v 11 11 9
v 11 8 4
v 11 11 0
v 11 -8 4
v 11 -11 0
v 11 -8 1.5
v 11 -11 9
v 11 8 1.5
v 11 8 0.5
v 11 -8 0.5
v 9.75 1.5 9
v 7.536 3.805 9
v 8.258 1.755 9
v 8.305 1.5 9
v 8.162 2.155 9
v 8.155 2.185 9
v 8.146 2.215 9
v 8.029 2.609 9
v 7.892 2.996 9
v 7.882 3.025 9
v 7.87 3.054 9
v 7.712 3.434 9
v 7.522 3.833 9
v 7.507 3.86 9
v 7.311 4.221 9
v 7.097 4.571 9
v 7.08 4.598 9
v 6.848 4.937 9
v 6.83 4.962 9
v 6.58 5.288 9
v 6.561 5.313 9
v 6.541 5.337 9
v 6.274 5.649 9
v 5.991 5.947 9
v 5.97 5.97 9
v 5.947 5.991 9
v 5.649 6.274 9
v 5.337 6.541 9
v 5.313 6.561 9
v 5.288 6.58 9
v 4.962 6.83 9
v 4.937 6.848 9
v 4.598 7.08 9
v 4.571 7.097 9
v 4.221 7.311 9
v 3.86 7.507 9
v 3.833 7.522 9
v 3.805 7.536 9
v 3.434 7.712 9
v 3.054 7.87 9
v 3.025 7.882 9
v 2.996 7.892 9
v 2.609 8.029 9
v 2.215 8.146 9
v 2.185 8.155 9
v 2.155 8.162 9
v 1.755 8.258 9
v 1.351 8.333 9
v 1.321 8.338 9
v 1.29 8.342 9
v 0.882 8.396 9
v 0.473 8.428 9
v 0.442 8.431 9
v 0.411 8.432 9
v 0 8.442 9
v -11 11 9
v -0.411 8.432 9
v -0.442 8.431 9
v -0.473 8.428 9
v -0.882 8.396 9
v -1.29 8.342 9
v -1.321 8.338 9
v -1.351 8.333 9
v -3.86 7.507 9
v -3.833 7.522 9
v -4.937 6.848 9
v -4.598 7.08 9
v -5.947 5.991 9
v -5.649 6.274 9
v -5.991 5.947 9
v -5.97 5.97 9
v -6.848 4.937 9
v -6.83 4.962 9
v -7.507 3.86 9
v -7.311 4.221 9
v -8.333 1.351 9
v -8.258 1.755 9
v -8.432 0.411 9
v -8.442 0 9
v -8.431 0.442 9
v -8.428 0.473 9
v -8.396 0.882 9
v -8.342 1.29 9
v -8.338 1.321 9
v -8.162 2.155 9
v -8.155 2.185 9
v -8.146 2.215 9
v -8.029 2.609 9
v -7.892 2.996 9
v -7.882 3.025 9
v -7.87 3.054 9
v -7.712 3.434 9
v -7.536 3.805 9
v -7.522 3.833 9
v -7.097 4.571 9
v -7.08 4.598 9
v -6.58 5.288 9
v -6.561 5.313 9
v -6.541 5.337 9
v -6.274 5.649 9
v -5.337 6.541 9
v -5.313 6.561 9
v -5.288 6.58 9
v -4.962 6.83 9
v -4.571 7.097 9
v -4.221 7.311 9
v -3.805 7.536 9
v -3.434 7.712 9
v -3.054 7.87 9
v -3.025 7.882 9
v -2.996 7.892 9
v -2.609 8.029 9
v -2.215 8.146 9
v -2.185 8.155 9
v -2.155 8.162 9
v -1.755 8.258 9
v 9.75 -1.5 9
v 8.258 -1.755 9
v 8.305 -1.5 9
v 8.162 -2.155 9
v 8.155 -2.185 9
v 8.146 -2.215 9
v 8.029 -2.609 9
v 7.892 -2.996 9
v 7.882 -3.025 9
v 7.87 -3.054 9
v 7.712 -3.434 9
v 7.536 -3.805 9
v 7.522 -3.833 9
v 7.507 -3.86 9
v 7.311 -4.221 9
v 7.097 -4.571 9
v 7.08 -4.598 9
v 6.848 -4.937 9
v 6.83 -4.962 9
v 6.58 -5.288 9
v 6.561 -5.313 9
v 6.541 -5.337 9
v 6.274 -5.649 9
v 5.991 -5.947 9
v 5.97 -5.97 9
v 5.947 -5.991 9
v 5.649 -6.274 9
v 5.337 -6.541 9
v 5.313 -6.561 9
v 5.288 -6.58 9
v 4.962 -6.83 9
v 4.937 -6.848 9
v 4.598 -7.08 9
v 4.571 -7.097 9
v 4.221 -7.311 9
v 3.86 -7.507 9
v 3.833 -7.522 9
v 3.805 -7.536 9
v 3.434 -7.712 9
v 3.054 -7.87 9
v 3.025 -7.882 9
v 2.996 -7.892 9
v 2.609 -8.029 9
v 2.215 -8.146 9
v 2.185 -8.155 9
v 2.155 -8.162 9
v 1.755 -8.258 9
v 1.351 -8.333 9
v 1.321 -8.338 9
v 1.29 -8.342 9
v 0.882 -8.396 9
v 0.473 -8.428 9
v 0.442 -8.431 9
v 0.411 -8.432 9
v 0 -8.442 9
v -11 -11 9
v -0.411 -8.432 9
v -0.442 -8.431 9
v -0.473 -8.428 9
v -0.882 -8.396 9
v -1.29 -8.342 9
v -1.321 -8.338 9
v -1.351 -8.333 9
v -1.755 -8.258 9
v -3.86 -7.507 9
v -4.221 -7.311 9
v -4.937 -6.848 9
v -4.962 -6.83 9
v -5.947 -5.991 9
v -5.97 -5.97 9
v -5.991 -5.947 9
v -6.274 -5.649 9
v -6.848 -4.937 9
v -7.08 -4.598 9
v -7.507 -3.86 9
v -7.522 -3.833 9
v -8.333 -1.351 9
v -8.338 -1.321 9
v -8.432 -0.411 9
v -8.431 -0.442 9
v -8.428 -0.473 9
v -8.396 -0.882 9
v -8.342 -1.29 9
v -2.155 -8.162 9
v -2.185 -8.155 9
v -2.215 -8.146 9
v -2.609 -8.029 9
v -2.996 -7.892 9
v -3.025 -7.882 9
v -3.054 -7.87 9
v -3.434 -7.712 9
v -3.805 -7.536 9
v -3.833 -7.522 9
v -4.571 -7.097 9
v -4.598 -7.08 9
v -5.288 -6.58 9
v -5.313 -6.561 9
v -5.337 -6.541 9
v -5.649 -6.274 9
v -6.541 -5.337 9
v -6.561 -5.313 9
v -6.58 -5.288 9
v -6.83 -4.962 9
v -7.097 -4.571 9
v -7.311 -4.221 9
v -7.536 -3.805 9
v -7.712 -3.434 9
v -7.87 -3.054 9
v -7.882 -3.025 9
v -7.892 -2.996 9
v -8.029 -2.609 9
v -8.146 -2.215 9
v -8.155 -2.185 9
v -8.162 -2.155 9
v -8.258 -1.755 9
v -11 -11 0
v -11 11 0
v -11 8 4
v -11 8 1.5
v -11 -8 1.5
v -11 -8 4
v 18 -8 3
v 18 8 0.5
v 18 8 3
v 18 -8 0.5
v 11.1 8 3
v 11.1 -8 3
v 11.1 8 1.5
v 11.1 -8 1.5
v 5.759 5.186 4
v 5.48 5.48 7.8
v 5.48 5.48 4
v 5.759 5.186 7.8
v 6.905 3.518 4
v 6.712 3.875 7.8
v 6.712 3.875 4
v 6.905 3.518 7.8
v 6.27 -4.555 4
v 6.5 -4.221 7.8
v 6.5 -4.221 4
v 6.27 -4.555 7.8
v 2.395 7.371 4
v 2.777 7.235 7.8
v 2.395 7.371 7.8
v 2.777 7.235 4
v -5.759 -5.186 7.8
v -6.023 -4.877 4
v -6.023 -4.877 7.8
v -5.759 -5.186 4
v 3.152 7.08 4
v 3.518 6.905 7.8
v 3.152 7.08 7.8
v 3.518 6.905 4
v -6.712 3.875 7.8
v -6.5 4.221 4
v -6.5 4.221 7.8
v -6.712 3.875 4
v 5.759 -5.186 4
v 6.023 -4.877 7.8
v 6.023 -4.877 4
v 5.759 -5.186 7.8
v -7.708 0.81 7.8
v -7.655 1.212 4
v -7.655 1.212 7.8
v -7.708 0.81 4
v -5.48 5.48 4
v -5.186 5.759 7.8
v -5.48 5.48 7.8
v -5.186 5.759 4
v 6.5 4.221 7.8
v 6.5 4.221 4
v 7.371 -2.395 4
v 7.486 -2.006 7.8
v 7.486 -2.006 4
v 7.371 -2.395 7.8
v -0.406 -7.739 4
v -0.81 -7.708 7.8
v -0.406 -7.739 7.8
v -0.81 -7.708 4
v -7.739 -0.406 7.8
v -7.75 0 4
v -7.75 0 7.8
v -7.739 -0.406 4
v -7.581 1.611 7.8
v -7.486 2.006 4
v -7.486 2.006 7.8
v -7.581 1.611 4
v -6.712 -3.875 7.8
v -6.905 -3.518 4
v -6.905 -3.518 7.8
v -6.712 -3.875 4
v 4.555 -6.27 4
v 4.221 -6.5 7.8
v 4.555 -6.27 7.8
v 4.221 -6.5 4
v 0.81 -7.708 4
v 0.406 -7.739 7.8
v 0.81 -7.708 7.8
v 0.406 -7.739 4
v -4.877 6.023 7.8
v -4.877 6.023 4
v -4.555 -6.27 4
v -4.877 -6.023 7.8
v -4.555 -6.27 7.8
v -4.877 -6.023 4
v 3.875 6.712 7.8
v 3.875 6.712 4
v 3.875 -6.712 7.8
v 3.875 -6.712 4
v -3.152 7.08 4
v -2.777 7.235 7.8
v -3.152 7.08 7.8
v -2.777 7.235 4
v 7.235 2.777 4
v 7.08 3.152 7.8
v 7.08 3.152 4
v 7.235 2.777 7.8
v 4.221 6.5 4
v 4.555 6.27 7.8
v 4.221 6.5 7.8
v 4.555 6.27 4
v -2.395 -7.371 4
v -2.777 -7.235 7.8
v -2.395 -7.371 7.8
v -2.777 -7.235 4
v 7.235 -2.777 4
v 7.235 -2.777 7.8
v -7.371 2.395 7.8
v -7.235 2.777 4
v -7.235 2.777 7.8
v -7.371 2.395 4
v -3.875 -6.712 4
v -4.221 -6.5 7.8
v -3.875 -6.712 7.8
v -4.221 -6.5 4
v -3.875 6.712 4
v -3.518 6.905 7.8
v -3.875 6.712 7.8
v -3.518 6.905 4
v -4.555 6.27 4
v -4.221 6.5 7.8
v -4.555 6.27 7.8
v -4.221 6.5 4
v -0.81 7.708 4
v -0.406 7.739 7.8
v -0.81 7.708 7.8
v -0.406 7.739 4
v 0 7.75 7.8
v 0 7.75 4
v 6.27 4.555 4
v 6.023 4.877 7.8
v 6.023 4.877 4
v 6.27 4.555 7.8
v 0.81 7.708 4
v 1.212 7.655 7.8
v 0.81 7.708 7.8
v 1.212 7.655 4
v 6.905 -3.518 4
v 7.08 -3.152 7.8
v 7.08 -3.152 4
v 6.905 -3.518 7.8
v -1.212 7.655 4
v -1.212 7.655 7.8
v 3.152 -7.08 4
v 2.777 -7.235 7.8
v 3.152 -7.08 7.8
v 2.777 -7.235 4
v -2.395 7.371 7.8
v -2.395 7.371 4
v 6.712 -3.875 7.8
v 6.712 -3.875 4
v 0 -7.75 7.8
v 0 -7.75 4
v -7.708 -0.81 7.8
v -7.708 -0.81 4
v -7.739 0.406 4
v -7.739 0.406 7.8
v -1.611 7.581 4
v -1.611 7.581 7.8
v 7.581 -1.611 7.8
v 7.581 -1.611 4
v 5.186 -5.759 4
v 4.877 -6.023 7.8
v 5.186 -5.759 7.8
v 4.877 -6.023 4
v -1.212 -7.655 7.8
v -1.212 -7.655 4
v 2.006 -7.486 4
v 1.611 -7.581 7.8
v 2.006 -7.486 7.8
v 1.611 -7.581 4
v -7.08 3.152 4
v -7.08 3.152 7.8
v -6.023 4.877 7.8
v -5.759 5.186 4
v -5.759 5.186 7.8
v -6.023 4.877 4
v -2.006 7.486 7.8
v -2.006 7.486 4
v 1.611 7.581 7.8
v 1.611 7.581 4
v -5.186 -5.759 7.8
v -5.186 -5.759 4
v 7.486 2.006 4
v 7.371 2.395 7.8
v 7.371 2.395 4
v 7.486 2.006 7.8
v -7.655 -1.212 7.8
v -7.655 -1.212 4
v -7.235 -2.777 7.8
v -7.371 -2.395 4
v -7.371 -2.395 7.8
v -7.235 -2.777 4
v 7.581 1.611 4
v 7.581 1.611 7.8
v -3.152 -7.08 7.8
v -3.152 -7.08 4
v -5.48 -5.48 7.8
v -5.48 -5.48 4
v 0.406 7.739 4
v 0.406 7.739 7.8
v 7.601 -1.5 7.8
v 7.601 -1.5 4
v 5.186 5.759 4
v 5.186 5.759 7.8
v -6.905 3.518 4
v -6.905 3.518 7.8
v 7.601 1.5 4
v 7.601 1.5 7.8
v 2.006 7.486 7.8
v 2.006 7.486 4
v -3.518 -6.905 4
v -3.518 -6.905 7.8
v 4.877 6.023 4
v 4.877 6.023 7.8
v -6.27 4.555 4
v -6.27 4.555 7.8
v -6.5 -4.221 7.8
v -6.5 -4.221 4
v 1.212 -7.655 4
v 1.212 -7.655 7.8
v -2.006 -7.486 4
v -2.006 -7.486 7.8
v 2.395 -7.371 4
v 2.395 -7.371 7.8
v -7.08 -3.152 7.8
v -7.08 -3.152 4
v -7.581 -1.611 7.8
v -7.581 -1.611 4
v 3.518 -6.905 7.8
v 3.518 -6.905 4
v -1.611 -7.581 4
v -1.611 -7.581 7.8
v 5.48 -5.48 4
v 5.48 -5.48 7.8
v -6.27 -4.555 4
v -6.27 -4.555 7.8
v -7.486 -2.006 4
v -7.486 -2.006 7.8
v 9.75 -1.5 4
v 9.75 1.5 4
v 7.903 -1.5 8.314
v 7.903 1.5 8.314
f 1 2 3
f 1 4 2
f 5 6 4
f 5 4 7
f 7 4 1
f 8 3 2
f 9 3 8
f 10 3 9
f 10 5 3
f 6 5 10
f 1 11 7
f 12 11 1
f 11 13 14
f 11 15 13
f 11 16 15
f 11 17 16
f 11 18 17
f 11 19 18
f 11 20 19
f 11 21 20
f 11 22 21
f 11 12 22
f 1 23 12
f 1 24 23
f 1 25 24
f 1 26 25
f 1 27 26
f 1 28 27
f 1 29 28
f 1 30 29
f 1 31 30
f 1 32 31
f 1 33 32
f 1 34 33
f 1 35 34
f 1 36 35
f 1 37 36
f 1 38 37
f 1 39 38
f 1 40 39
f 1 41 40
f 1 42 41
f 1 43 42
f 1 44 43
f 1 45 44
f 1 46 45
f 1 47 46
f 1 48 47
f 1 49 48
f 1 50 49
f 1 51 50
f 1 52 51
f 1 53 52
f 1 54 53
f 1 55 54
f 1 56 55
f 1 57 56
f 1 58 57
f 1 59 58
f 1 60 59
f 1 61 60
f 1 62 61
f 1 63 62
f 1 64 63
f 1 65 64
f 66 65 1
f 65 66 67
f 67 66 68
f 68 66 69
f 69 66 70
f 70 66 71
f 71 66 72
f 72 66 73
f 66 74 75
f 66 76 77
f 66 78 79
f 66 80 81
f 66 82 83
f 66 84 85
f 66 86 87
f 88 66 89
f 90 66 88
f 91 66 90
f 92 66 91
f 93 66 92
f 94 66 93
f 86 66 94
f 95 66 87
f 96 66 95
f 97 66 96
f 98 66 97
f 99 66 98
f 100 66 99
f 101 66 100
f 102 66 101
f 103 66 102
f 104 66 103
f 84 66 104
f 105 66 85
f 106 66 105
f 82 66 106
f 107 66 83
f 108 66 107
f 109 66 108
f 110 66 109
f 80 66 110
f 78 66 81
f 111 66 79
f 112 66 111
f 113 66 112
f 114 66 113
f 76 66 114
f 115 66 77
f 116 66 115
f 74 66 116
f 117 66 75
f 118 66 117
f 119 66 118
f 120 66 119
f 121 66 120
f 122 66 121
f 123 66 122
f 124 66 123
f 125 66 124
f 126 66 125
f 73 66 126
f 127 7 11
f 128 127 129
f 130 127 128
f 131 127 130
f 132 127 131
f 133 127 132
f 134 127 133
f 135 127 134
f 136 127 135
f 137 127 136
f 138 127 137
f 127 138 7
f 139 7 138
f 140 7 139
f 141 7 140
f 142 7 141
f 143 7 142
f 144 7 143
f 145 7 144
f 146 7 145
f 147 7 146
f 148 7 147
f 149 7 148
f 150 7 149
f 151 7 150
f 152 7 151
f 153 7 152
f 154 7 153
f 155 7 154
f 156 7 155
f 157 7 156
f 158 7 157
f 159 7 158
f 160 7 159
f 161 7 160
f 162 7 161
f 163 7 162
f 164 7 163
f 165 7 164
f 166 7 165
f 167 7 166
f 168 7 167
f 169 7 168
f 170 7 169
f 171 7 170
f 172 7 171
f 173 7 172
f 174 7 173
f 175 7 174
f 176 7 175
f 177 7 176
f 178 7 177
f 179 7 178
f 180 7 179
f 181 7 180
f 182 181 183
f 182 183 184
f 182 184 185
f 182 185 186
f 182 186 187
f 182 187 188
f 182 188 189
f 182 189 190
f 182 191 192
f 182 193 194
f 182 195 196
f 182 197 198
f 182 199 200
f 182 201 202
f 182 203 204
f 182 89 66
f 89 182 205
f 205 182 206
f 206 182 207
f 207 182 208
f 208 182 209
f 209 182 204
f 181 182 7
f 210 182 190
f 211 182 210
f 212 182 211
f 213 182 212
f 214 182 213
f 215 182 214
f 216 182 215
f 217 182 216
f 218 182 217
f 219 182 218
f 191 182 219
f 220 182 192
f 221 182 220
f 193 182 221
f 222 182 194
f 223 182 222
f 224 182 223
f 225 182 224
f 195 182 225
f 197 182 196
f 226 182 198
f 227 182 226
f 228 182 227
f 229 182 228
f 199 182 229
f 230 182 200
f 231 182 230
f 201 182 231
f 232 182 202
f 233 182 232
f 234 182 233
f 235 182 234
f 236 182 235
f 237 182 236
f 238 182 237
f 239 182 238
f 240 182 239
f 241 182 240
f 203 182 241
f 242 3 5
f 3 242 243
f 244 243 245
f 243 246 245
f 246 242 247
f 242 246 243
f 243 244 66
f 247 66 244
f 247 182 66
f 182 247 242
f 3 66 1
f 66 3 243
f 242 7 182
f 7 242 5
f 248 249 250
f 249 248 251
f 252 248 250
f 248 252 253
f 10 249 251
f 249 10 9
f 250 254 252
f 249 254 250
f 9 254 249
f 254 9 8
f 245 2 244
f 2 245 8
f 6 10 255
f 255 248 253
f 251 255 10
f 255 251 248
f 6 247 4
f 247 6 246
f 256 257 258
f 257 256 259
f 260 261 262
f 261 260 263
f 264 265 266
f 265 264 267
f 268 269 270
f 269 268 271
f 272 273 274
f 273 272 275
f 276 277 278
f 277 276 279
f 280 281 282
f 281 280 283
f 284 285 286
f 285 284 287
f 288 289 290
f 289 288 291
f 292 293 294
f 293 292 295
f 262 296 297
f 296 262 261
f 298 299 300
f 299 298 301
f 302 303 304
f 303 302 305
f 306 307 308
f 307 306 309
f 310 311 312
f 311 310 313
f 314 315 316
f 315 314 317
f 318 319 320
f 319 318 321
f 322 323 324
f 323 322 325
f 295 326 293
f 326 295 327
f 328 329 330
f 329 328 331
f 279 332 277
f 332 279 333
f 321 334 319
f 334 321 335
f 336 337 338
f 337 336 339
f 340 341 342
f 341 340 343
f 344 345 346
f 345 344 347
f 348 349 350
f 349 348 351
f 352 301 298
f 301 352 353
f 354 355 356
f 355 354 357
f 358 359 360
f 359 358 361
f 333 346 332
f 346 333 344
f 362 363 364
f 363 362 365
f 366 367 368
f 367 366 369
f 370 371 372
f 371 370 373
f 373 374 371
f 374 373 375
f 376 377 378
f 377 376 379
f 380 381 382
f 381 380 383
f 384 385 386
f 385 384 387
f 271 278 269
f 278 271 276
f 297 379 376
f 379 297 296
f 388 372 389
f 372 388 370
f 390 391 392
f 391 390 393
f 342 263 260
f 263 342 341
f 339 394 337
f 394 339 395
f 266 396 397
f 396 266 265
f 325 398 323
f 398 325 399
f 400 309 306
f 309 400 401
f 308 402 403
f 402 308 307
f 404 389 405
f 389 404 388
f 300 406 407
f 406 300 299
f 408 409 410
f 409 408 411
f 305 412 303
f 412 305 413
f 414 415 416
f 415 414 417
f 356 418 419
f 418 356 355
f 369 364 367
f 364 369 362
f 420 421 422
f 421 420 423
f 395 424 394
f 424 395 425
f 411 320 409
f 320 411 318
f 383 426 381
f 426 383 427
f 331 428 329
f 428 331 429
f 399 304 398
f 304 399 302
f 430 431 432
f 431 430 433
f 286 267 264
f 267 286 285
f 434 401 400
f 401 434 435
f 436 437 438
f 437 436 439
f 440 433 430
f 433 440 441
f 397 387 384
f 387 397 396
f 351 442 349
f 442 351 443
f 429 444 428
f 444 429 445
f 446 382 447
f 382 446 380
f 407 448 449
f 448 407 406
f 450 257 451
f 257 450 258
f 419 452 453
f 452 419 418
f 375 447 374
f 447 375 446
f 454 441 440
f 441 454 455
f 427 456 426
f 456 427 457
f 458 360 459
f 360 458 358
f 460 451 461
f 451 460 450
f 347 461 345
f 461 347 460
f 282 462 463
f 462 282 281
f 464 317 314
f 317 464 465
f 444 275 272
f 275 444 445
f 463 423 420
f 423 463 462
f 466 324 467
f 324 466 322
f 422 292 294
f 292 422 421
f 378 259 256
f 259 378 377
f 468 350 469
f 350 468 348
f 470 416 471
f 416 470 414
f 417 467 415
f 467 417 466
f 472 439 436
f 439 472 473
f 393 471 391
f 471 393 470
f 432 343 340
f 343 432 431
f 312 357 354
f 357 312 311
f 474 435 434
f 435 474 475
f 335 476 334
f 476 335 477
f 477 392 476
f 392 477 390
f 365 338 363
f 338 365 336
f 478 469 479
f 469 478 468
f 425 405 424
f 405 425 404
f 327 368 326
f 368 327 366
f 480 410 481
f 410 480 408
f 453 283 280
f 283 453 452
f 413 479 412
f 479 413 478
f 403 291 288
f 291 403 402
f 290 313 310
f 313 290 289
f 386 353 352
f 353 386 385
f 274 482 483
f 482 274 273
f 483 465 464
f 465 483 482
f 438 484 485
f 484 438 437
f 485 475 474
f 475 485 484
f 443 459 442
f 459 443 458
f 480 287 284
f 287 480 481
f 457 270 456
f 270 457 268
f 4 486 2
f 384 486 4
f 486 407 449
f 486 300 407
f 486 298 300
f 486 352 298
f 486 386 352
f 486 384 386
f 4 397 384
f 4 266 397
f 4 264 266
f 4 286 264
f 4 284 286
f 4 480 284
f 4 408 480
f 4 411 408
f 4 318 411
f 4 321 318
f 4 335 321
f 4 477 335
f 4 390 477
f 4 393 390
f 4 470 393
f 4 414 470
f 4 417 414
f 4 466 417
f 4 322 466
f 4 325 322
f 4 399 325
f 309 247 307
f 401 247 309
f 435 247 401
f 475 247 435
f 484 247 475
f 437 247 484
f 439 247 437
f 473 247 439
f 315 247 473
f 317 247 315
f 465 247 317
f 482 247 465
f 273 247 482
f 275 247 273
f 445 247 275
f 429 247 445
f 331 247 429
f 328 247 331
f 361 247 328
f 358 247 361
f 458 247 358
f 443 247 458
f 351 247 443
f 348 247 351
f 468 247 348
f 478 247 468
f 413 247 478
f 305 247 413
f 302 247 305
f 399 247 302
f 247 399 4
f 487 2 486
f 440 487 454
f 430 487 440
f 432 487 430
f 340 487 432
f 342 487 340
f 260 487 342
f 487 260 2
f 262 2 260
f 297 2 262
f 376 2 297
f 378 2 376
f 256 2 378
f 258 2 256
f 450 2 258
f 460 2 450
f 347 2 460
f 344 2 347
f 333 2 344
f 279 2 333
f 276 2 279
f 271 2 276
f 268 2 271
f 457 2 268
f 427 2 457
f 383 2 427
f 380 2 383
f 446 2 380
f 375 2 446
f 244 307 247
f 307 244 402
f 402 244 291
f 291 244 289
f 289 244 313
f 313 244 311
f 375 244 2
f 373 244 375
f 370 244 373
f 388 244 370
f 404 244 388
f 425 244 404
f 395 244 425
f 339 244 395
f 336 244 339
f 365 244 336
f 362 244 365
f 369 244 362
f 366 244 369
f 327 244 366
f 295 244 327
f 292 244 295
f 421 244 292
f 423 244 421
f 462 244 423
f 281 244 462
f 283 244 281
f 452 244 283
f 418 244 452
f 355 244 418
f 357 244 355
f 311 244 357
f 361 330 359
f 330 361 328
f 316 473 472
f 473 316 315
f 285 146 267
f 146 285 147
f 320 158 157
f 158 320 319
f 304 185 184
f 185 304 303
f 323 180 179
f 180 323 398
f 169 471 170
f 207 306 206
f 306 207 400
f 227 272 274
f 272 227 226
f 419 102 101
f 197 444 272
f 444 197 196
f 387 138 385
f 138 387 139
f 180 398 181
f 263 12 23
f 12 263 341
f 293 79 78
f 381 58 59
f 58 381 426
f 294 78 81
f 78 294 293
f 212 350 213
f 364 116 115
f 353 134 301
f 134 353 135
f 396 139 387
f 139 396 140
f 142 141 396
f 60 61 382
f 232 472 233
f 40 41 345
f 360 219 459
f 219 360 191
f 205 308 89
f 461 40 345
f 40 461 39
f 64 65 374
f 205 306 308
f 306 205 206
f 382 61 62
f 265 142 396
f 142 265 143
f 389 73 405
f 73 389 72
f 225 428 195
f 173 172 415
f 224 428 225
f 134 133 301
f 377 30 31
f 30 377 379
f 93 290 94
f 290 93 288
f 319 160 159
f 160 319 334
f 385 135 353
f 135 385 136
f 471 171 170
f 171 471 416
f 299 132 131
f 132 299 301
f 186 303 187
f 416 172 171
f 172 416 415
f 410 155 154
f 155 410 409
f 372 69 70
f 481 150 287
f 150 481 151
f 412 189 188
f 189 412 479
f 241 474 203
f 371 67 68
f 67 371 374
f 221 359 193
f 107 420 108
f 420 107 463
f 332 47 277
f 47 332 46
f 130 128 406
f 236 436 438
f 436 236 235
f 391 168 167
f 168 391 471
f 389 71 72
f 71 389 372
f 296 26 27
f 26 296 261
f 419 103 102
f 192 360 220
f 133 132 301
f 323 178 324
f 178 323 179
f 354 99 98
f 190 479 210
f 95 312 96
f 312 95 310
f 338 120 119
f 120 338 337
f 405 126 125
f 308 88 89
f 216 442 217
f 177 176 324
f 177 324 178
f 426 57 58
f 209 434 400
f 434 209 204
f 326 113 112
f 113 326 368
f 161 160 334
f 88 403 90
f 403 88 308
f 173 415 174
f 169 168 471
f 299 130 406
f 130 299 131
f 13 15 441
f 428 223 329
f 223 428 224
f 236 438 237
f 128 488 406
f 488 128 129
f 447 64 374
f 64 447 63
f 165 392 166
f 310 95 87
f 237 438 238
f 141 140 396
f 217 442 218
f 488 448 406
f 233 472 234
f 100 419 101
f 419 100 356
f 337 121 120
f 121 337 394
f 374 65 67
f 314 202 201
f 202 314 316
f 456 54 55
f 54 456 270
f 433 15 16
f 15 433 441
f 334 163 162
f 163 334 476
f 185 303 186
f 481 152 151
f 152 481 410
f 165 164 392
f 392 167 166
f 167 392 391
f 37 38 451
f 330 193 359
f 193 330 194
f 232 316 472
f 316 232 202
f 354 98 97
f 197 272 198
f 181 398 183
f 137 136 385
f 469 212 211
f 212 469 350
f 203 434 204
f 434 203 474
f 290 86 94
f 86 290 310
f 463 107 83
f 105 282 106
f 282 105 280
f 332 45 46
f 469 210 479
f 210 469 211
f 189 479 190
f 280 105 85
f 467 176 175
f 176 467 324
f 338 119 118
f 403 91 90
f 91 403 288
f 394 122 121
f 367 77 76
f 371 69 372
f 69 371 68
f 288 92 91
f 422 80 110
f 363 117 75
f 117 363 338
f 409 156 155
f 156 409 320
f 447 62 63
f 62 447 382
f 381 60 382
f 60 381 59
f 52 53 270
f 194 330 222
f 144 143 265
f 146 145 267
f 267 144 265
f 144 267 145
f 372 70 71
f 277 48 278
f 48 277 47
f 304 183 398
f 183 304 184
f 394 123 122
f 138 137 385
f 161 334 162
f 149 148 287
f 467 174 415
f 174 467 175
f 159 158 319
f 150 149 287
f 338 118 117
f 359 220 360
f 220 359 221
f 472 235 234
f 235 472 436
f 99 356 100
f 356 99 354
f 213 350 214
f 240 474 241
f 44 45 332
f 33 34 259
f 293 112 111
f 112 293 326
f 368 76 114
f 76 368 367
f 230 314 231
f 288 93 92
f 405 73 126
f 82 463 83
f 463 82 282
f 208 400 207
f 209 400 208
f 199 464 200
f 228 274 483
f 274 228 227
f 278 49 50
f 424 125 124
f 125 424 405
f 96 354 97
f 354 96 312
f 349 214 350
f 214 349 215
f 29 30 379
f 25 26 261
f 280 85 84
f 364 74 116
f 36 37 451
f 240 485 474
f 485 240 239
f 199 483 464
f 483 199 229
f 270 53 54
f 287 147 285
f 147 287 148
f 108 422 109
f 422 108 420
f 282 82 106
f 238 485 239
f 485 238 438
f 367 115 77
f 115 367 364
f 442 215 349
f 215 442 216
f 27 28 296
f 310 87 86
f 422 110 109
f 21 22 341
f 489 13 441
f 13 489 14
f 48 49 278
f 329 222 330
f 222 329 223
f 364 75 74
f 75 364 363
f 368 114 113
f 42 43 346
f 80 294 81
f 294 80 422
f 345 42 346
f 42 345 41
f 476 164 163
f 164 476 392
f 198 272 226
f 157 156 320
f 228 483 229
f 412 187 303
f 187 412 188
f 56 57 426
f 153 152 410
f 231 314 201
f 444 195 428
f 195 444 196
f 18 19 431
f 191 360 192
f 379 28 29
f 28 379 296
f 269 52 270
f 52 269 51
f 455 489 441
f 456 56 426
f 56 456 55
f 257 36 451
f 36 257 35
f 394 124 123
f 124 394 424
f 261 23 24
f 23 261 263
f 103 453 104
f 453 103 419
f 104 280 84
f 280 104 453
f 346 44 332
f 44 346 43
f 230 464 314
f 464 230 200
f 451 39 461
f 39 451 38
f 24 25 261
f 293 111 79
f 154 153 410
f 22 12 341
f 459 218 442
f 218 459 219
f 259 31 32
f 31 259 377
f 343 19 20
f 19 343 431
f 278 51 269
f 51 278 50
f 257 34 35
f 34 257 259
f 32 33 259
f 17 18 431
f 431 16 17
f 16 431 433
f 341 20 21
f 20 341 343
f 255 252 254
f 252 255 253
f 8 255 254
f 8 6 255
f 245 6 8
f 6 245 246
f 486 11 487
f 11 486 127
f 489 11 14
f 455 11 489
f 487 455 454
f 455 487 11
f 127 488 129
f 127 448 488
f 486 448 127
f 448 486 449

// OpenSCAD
// file: params.scad
// ============================================================
// EpiScreen EEG Electrode Mold — Shared Parameters
// Project: EpiScreen / NeoGuard / HairSite / ImpactGuard
// Author:  Generated for ISEF submission
// Date:    2026-03-28
// License: MIT
// ============================================================

// ── Global print-quality settings ──────────────────────────
$fn = 120;           // Cylinder facets (high quality)
FILLET  = 0.2;       // Edge fillet for printability (mm)
CLEARANCE = 0.3;     // Mating-surface clearance (mm)
WALL    = 1.5;       // Minimum wall thickness (mm)
DRAFT   = 2;         // Draft angle on vertical walls (deg)

// ── Alignment pin/hole geometry ────────────────────────────
PIN_D   = 2.0;       // Alignment pin diameter (mm)
PIN_H   = 3.0;       // Alignment pin height (mm)
PIN_R   = 4;         // Number of alignment pins

// ── Vent hole geometry ──────────────────────────────────────
VENT_D  = 1.0;       // Vent hole diameter (mm)

// ── EpiScreen standard electrode (24 mm) ───────────────────
EP_OD       = 24.0;  // Electrode outer diameter
EP_H        = 10.0;  // Electrode total height
EP_BOT_CAV_D = 12.0; // Bottom skin-contact cavity diameter
EP_BOT_CAV_H = 1.0;  // Bottom skin-contact cavity depth
EP_MOLD_OD  = EP_OD + 2*WALL + 4.0;  // = 32 mm mold OD
EP_BOT_H    = 5.0;   // Bottom mold piece height
EP_TOP_H    = EP_H - EP_BOT_H + WALL; // Top mold piece height
EP_POUR_D   = 6.0;   // Silicone pour hole diameter

// FR-4 seat
EP_FR4_D    = 19.0;  // FR-4 disk diameter
EP_FR4_T    = 1.6;   // FR-4 disk thickness
EP_FR4_Z    = 3.0;   // Shelf height above cavity bottom
EP_FR4_LIP  = 0.2;   // Centering lip width

// Reservoir ring (protrusion on top mold)
EP_RES_ID   = 13.0;  // Reservoir inner diameter
EP_RES_OD   = 19.0;  // Reservoir outer diameter
EP_RES_H    = 1.5;   // Reservoir channel height

// Spiral platform
EP_SPIRAL_D = 8.0;   // Spiral platform diameter
EP_SPIRAL_H = 0.8;   // Spiral platform height

// Cable exit notch
EP_CABLE_W_BOT = 3.0; // Cable notch width at bottom
EP_CABLE_W_TOP = 4.0; // Cable notch width at top (funnel)
EP_CABLE_D  = 3.0;   // Cable notch depth

// Microchannel wires
EP_MCH_D    = 0.6;   // Microchannel hole diameter
EP_MCH_N    = 3;     // Number of microchannel holes
EP_MCH_ANG  = 37.5;  // Microchannel angle (degrees)

// ── NeoGuard neonatal electrode (15 mm) ────────────────────
NG_OD       = 15.0;
NG_H        = 8.0;
NG_BOT_CAV_D = 8.0;
NG_BOT_CAV_H = 0.8;
NG_MOLD_OD  = NG_OD + 2*WALL + 4.0; // ~22 mm
NG_BOT_H    = 4.0;
NG_TOP_H    = NG_H - NG_BOT_H + WALL;
NG_POUR_D   = 4.0;
NG_FR4_D    = 12.0;
NG_FR4_T    = 1.0;
NG_FR4_Z    = 2.5;
NG_RES_ID   = 8.5;
NG_RES_OD   = 12.0;
NG_RES_H    = 1.2;
NG_SPIRAL_D = 5.0;
NG_SPIRAL_H = 0.6;
NG_CABLE_W_BOT = 2.5;
NG_CABLE_W_TOP = 3.5;
NG_CABLE_D  = 2.5;

// ── HairSite electrode (24 mm + 7 penetration pins) ────────
HS_OD       = 24.0;  // Same outer body as EpiScreen
HS_H        = 12.0;  // Taller to accommodate pins
HS_MOLD_OD  = HS_OD + 2*WALL + 4.0; // 32 mm
HS_BOT_H    = 6.0;
HS_TOP_H    = HS_H - HS_BOT_H + WALL;
HS_POUR_D   = 6.0;

// Pin array (7 pins: 1 center + 6 at 60-deg spacing)
HS_PIN_D    = 1.2;   // Pin hole diameter in mold
HS_PIN_H    = 8.0;   // Pin post height in mold
HS_PIN_RAD  = 6.0;   // Radius of outer 6 pins
HS_PIN_N    = 7;     // Total pins

// ── ImpactGuard helmet adapter ──────────────────────────────
IG_OD       = 38.0;  // Adapter outer diameter
IG_H        = 12.0;  // Total height
IG_ELEC_D   = 24.5;  // Electrode socket (electrode OD + clearance)
IG_ELEC_H   = 8.0;   // Electrode insertion depth
IG_SNAP_R   = 0.8;   // Snap-fit ring radius
IG_MOUNT_W  = 50.0;  // Mounting plate width
IG_MOUNT_H  = 8.0;   // Mounting plate height

// ── Headband mount — adult (24 mm electrode) ───────────────
HBA_BAND_W  = 22.0;  // Band width
HBA_BAND_T  = 2.5;   // Band thickness
HBA_ELEC_D  = 24.5;  // Electrode socket
HBA_ELEC_H  = 6.0;   // Electrode retention depth
HBA_CLIP_H  = 12.0;  // Clip block height
HBA_CLIP_W  = 30.0;  // Clip block width
HBA_SNAP_R  = 0.8;   // Snap ring radius

// ── Headband mount — neonatal (15 mm electrode) ────────────
HBN_BAND_W  = 16.0;
HBN_BAND_T  = 2.0;
HBN_ELEC_D  = 15.5;
HBN_ELEC_H  = 5.0;
HBN_CLIP_H  = 9.0;
HBN_CLIP_W  = 22.0;
HBN_SNAP_R  = 0.6;

// ── Concentric micro-texture on skin-contact surface ───────
TEXTURE_STEP  = 0.5;  // Ring spacing (mm)
TEXTURE_DEPTH = 0.15; // Ring depth (mm)
TEXTURE_W     = 0.2;  // Ring width (mm)
// main file
// ============================================================
// Neonatal Headband Mount — for 15 mm NeoGuard electrode
// ============================================================
// Ultra-low-profile design for neonatal/infant use.
// Very gentle clamping force; designed for thin silicone bands.
//
// Features:
//   – Electrode socket (15.5 mm bore) with soft snap ring
//   – Band channel (16 mm wide, 2 mm thick)
//   – Minimal protrusion (9 mm clip height)
// ============================================================

include <params.scad>

headband_neonatal();

module headband_neonatal() {
    difference() {
        union() {
            // Clip block
            translate([-HBN_CLIP_W/2, -HBN_CLIP_W/2, 0])
                cube([HBN_CLIP_W, HBN_CLIP_W, HBN_CLIP_H], center = false);

            // Velcro ears (smaller)
            for (side = [-1, 1])
                translate([side * (HBN_CLIP_W/2), -HBN_BAND_W/2, 0.5])
                    cube([side * 7, HBN_BAND_W, 2.5], center = false);
        }

        // Electrode socket
        translate([0, 0, HBN_CLIP_H - HBN_ELEC_H])
            electrode_socket_neo();

        // Band channel
        translate([-HBN_CLIP_W/2 - 0.1, -HBN_BAND_W/2,
                    HBN_CLIP_H - HBN_ELEC_H - HBN_BAND_T - 0.5])
            cube([HBN_CLIP_W + 0.2, HBN_BAND_W,
                  HBN_BAND_T + 0.5], center = false);

        // Cable exit
        translate([HBN_ELEC_D/2 - 1.5, -EP_CABLE_W_BOT/2,
                    HBN_CLIP_H - HBN_ELEC_H])
            cube([EP_CABLE_D + 0.5, EP_CABLE_W_BOT,
                  HBN_ELEC_H + 0.1], center = false);
    }
}

module electrode_socket_neo() {
    cylinder(d = HBN_ELEC_D, h = HBN_ELEC_H + 0.1, center = false);

    // Snap ring (shallower = easier for neonatal use)
    translate([0, 0, HBN_ELEC_H / 3])
        rotate_extrude()
            translate([HBN_ELEC_D/2 - HBN_SNAP_R, 0, 0])
                circle(r = HBN_SNAP_R);

    // Lead-in chamfer
    translate([0, 0, HBN_ELEC_H - 1.2])
        cylinder(d1 = HBN_ELEC_D, d2 = HBN_ELEC_D + 1.5,
                 h = 1.3, center = false);
}
